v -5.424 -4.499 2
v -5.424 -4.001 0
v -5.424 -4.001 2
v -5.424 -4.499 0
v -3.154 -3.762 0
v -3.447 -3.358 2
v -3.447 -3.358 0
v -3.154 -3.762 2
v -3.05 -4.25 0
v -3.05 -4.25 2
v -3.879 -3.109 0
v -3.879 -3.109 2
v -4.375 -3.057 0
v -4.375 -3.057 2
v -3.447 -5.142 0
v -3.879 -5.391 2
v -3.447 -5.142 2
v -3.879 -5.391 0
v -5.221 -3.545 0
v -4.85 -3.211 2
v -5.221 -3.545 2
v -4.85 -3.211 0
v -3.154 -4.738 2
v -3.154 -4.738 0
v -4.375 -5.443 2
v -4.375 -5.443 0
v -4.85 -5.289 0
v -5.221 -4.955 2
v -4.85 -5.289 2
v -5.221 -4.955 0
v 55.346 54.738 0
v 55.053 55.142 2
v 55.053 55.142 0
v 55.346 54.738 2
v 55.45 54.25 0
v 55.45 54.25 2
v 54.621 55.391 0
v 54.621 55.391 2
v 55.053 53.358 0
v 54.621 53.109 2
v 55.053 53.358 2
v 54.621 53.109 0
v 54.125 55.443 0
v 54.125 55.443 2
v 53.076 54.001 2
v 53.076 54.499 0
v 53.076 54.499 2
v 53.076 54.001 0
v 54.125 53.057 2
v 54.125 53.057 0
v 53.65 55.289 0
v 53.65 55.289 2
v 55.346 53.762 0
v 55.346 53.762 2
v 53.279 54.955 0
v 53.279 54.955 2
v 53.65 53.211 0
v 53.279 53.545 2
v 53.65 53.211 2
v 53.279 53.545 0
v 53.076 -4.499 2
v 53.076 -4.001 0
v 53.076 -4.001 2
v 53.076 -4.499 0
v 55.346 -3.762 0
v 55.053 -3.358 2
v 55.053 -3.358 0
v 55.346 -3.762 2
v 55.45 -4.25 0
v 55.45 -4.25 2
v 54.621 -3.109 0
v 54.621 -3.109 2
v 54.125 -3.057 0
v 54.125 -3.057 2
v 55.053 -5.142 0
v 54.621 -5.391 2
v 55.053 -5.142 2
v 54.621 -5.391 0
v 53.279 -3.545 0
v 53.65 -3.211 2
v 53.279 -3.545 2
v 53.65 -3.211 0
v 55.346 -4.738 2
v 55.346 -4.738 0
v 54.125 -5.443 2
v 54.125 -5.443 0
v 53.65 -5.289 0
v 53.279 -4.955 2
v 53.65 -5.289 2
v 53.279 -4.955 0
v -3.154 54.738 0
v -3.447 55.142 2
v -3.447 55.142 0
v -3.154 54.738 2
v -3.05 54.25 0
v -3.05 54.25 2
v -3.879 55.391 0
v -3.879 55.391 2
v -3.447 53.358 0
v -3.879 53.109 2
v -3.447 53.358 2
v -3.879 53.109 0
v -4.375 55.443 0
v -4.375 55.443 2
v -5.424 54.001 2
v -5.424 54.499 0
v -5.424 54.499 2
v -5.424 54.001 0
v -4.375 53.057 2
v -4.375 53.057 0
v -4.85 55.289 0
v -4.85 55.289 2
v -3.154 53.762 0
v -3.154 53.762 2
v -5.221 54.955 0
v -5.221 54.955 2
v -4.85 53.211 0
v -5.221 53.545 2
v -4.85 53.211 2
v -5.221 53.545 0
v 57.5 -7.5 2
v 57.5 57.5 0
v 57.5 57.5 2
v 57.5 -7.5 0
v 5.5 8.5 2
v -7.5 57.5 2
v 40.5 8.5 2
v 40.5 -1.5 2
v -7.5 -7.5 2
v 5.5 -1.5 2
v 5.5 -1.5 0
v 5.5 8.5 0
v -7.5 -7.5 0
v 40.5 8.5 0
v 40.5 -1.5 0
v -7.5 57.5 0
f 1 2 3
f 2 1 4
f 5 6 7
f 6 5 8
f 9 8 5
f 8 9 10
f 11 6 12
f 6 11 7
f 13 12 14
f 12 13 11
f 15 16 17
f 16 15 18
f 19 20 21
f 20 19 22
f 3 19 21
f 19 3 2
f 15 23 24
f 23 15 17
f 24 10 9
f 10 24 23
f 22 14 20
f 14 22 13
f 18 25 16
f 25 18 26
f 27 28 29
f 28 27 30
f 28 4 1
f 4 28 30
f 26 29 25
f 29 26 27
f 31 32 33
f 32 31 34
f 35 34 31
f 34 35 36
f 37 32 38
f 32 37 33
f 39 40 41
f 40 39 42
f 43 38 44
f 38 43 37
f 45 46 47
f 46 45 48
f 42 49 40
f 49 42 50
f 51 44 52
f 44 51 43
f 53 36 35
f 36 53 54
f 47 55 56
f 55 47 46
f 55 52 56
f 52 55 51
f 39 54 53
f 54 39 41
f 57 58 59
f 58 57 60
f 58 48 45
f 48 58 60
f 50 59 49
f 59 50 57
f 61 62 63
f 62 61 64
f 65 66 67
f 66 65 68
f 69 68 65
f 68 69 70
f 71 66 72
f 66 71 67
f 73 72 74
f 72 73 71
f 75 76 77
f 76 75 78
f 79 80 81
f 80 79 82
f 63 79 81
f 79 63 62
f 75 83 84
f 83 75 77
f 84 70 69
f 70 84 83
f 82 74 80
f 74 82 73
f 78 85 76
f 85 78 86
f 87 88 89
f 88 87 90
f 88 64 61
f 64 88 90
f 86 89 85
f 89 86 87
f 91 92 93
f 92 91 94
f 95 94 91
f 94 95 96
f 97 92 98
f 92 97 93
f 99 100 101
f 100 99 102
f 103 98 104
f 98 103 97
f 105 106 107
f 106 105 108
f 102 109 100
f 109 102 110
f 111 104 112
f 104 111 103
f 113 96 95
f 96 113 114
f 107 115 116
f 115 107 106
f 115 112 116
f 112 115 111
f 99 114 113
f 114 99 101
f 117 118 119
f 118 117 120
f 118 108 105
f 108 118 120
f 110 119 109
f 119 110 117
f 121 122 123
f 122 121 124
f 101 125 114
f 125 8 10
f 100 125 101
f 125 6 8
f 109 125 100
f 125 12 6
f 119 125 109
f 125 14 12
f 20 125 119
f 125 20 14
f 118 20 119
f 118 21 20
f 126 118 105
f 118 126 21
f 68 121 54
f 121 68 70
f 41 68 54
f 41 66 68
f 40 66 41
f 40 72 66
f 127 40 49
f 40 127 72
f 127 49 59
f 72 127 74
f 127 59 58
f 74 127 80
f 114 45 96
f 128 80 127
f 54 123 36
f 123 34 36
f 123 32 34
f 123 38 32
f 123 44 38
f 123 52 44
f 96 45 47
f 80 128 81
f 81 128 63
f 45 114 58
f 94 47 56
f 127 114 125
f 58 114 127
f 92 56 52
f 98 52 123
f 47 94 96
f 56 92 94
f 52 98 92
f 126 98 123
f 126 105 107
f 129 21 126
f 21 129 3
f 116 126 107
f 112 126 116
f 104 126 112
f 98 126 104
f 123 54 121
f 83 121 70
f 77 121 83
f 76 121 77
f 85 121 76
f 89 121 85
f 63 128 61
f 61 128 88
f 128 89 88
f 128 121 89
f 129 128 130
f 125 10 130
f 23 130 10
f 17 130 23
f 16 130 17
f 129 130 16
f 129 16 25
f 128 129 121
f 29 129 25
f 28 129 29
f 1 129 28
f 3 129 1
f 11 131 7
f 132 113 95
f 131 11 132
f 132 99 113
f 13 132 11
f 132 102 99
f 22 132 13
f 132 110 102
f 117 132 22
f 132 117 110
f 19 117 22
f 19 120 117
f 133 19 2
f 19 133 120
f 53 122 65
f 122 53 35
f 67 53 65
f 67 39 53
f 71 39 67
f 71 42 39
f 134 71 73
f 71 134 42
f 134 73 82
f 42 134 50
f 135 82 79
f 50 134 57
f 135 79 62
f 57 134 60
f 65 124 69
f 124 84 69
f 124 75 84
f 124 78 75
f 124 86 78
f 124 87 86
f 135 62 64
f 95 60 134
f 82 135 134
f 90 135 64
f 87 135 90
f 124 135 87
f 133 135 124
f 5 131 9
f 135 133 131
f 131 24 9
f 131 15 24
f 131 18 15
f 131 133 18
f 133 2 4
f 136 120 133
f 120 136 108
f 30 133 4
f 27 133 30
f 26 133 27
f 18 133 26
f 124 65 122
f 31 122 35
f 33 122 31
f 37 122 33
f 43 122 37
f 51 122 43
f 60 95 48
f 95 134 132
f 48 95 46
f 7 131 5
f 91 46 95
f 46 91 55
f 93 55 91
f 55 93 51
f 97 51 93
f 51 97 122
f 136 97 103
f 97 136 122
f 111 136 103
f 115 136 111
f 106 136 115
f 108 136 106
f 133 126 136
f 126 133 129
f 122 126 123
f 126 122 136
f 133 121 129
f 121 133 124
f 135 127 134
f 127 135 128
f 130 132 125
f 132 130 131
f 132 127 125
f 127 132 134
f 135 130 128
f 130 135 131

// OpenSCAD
bottom_thickness = 2;
board_X = 50;
board_Y = 50;
standoff_offset=1.0;
heat_set_insert_dim_xy = 6.5;

chassis_board_dim = [board_X+(standoff_offset*2)+(heat_set_insert_dim_xy*2),board_Y+(standoff_offset*2)+(heat_set_insert_dim_xy*2),bottom_thickness];

module standoff_holder(xyz=[0,0,0]) {
    insert_height = 10;
    bottom_thickness = 2;
    cube_dim = [6,6];
    standoff_r = 1.4;

    translate([xyz[0], xyz[1], xyz[2]+bottom_thickness]){
    difference(){
    translate([0,0,-bottom_thickness + (insert_height + bottom_thickness)/2]){
        cube([cube_dim[0],cube_dim[1],insert_height+bottom_thickness],center=true);
    }

    cylinder(20,standoff_r ,standoff_r ,$fn=100);
    }
    }
}

module screw_hole(translate_pos = [0,0,0], insert_xy_dim = [heat_set_insert_dim_xy,heat_set_insert_dim_xy], insert_height = 8, hole_r=1.2, hole_h=7.5, cylinder_fn = 15){
    insert_width = insert_xy_dim[0];
    insert_depth = insert_xy_dim[1];
    insert_height = insert_height;
    
    translate(translate_pos){
            translate([insert_width/2,insert_depth/2,insert_height - hole_h]){
                cylinder(hole_h+1,hole_r,hole_r, $fn=cylinder_fn);
            }
    }
}


difference(){
    translate([-standoff_offset-heat_set_insert_dim_xy,-standoff_offset-heat_set_insert_dim_xy,0]){
        cube(chassis_board_dim);
    }

    translate([0,0,-2]){
    screw_hole(translate_pos=[0-standoff_offset-heat_set_insert_dim_xy ,0-standoff_offset-heat_set_insert_dim_xy ,0] );
    screw_hole(translate_pos=[50-heat_set_insert_dim_xy+standoff_offset+heat_set_insert_dim_xy,50-heat_set_insert_dim_xy+standoff_offset+heat_set_insert_dim_xy,0]);
    screw_hole(translate_pos=[50-heat_set_insert_dim_xy+standoff_offset+heat_set_insert_dim_xy,0-standoff_offset-heat_set_insert_dim_xy,0]);
    screw_hole(translate_pos=[0-standoff_offset-heat_set_insert_dim_xy,50-heat_set_insert_dim_xy+standoff_offset+heat_set_insert_dim_xy,0]);
    }
    
    translate([5.5,-1.5,-2]){
    cube([35,10,5]);
    }
}
